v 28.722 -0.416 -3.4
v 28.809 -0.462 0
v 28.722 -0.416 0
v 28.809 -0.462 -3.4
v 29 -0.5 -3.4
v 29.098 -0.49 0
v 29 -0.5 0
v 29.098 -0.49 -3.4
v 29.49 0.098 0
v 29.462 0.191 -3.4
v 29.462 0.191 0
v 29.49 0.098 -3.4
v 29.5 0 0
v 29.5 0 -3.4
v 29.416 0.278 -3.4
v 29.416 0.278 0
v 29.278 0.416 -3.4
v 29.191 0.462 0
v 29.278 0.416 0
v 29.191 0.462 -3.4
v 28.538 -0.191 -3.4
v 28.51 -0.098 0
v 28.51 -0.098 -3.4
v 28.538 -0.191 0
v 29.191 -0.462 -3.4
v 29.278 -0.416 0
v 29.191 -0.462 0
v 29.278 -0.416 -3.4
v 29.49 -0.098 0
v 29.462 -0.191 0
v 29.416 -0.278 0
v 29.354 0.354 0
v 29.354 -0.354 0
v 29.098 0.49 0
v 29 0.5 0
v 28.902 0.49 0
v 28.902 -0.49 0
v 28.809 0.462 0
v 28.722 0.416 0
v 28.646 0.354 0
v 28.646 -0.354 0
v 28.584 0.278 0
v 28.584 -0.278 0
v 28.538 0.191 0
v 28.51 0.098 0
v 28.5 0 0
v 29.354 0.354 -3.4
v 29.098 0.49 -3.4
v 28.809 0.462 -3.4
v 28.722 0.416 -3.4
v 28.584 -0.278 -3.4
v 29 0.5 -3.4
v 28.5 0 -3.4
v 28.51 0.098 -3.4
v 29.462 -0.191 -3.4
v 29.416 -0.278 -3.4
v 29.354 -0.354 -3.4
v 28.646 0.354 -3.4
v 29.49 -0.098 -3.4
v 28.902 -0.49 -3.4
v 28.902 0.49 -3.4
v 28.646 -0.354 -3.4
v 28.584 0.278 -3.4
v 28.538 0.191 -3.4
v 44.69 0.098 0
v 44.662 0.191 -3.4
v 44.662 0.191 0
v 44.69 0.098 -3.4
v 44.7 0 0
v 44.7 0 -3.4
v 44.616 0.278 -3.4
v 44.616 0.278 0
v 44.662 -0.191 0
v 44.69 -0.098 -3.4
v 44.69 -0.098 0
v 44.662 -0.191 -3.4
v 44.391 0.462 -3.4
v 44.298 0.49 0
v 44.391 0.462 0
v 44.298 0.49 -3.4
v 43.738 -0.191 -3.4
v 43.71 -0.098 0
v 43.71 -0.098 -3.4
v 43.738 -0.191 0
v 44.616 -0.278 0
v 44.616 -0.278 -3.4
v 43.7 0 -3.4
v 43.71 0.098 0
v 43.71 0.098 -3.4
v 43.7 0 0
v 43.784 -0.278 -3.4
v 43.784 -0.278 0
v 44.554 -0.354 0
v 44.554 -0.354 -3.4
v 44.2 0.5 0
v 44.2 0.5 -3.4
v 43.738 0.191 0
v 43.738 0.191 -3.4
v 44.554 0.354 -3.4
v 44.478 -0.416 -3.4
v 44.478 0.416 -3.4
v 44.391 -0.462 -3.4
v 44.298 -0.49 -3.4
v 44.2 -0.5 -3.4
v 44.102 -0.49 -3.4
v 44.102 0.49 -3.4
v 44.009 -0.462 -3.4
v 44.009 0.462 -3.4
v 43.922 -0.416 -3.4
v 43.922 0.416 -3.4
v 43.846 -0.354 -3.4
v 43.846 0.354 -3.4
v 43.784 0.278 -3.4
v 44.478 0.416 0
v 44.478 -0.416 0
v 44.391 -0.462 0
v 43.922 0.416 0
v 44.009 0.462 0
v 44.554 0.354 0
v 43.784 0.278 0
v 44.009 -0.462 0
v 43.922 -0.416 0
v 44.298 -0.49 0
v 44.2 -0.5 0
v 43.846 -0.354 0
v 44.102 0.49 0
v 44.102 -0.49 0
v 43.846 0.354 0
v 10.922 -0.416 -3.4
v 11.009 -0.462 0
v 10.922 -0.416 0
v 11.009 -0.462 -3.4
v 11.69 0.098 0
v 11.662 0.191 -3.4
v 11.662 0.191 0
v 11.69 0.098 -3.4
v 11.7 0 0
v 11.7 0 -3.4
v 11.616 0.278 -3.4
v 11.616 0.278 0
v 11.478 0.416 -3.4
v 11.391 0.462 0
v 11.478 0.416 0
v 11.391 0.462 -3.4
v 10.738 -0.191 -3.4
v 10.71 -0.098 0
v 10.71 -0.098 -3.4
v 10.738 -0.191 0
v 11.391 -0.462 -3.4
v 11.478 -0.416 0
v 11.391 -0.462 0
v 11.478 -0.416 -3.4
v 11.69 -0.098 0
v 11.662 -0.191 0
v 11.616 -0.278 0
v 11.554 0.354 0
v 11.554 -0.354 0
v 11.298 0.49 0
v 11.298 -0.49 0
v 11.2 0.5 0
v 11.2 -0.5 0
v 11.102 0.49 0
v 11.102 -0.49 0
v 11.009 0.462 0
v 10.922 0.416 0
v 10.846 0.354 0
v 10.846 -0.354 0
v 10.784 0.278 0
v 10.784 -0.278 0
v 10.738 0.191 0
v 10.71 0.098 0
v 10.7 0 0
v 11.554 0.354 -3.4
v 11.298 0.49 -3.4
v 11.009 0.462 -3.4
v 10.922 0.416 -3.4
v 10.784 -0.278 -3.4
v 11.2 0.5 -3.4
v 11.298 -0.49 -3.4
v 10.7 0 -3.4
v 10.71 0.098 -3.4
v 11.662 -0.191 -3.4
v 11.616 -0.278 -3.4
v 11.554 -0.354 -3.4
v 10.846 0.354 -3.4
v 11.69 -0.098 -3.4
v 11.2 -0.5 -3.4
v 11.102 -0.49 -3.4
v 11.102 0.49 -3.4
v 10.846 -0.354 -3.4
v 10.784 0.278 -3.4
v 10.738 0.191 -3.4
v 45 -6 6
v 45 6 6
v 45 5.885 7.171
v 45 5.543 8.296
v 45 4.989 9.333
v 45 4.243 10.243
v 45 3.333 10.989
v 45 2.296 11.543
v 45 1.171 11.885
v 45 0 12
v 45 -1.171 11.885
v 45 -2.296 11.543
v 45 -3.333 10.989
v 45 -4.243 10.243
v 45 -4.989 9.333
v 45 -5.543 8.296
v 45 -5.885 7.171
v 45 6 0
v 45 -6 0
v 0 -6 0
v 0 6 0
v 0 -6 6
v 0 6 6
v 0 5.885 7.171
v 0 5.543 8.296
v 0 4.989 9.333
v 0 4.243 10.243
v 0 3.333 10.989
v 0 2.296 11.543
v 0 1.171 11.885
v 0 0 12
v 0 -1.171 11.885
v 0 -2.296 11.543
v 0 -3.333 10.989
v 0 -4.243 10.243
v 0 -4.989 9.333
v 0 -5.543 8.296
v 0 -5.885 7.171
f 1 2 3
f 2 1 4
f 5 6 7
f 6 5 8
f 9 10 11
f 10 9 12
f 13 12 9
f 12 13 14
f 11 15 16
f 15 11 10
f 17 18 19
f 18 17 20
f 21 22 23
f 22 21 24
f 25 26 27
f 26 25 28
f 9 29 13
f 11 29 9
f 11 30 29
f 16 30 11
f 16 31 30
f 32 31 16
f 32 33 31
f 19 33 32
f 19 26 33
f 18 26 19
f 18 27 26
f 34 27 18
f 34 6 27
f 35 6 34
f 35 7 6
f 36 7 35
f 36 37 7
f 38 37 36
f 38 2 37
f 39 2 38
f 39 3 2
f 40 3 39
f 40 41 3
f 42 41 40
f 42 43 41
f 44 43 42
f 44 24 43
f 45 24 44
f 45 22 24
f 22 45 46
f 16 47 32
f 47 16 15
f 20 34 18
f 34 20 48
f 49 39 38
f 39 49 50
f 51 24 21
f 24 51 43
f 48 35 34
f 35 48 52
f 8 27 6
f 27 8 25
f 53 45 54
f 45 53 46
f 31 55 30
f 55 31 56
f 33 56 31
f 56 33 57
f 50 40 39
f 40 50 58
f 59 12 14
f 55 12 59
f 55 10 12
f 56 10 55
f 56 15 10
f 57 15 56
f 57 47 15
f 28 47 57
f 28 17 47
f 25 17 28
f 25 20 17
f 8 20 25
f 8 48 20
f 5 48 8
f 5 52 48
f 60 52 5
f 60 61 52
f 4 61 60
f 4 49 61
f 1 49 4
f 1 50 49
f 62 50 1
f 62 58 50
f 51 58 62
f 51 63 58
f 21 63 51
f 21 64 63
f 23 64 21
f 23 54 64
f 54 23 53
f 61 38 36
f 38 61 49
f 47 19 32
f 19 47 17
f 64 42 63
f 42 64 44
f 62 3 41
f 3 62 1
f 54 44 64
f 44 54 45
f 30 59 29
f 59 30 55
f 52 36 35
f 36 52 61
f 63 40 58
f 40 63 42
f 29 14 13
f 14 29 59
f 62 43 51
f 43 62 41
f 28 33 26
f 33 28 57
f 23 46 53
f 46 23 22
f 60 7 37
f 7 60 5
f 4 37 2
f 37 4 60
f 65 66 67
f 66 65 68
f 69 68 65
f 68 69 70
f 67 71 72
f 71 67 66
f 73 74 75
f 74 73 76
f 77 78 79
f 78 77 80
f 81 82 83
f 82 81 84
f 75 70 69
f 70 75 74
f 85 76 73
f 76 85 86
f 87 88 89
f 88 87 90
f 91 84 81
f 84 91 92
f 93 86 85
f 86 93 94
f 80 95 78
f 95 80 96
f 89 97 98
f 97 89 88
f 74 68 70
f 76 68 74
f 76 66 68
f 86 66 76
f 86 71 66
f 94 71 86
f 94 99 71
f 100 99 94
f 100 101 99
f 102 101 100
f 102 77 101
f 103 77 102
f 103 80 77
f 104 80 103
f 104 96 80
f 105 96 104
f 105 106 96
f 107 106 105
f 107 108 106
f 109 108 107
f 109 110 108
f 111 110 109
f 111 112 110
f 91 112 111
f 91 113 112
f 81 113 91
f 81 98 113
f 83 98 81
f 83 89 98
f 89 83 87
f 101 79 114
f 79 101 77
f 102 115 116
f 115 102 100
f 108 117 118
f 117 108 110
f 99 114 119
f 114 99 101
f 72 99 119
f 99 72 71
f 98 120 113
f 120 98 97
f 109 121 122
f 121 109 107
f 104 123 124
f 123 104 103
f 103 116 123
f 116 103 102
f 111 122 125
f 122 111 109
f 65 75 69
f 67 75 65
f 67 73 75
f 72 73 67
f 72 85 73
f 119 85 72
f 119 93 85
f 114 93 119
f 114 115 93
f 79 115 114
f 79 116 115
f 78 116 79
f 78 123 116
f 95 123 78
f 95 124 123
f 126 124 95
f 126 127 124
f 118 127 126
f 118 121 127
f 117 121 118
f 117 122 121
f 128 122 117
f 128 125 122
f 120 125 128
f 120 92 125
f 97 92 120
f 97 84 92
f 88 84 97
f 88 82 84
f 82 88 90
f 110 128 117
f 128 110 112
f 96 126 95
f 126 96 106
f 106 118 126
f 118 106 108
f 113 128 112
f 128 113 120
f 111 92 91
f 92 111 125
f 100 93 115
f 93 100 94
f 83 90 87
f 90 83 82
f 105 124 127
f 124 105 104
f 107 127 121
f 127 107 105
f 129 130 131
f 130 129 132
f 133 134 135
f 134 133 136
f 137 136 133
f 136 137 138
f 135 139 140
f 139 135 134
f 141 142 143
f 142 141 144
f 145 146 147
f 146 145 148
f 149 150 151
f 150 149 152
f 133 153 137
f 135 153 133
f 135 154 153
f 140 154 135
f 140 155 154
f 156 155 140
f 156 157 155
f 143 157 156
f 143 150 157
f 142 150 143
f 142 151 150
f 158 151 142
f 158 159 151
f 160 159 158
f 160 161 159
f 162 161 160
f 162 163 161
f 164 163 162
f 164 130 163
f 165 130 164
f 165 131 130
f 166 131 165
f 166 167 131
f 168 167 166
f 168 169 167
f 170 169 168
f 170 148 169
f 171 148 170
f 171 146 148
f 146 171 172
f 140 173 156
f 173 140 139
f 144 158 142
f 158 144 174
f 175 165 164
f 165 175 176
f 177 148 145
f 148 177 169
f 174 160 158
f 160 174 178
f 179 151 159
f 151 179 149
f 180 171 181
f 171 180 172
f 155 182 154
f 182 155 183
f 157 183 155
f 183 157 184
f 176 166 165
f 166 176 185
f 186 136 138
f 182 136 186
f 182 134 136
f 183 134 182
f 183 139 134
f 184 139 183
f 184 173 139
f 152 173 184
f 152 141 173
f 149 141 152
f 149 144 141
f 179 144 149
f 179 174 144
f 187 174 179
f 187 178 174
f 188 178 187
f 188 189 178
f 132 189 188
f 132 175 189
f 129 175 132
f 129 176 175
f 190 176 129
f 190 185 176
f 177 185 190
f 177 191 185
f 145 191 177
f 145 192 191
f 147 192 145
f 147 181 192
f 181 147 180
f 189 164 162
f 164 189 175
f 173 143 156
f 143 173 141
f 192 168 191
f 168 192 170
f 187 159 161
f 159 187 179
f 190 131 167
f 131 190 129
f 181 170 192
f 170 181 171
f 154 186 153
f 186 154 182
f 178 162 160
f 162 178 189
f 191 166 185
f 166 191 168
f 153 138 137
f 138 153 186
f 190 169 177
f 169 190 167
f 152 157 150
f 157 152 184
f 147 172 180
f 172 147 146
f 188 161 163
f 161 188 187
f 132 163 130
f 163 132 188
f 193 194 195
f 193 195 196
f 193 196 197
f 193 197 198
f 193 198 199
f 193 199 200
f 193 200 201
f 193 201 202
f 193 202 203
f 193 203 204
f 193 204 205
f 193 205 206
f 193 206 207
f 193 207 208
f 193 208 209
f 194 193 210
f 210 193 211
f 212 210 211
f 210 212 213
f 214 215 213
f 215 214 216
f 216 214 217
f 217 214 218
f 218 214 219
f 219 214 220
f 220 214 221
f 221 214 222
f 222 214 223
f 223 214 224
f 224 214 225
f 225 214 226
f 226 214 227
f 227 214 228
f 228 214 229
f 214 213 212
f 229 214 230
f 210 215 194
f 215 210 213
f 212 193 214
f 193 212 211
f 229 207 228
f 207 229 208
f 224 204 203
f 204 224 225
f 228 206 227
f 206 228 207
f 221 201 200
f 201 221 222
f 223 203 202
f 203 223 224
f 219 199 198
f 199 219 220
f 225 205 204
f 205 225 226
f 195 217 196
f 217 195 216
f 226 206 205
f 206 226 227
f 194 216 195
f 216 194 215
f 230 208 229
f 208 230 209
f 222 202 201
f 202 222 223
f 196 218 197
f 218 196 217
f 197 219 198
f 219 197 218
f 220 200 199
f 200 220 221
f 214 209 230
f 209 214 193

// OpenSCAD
//
// simple model of Eaton BK/HBH-I-R fuse holder
//

$fn=32;

fh_dia = 12;
fh_len = 45;

pin_len = 3.4;
pin_dia = 1.0;

// pins
module pins() {
	  translate( [11.2, 0, -pin_len]) {
	  cylinder( d=pin_dia, h=pin_len);
	  translate( [17.8, 0, 0]) {
	       cylinder( d=pin_dia, h=pin_len);
	       translate( [15.2, 0, 0]) 	  cylinder( d=pin_dia, h=pin_len);
	  }
     }
}

// body
module body() {
     translate( [0, -fh_dia/2, 0])
	  cube( [fh_len, fh_dia, fh_dia/2]);
     translate( [0, 0, fh_dia/2])
	  rotate( [0, 90, 0]) {
	  cylinder( h=fh_len, d=fh_dia);
     }
}

module fuse_holder() {
     color("silver") pins();
     color("#404040") body();
}


fuse_holder();
